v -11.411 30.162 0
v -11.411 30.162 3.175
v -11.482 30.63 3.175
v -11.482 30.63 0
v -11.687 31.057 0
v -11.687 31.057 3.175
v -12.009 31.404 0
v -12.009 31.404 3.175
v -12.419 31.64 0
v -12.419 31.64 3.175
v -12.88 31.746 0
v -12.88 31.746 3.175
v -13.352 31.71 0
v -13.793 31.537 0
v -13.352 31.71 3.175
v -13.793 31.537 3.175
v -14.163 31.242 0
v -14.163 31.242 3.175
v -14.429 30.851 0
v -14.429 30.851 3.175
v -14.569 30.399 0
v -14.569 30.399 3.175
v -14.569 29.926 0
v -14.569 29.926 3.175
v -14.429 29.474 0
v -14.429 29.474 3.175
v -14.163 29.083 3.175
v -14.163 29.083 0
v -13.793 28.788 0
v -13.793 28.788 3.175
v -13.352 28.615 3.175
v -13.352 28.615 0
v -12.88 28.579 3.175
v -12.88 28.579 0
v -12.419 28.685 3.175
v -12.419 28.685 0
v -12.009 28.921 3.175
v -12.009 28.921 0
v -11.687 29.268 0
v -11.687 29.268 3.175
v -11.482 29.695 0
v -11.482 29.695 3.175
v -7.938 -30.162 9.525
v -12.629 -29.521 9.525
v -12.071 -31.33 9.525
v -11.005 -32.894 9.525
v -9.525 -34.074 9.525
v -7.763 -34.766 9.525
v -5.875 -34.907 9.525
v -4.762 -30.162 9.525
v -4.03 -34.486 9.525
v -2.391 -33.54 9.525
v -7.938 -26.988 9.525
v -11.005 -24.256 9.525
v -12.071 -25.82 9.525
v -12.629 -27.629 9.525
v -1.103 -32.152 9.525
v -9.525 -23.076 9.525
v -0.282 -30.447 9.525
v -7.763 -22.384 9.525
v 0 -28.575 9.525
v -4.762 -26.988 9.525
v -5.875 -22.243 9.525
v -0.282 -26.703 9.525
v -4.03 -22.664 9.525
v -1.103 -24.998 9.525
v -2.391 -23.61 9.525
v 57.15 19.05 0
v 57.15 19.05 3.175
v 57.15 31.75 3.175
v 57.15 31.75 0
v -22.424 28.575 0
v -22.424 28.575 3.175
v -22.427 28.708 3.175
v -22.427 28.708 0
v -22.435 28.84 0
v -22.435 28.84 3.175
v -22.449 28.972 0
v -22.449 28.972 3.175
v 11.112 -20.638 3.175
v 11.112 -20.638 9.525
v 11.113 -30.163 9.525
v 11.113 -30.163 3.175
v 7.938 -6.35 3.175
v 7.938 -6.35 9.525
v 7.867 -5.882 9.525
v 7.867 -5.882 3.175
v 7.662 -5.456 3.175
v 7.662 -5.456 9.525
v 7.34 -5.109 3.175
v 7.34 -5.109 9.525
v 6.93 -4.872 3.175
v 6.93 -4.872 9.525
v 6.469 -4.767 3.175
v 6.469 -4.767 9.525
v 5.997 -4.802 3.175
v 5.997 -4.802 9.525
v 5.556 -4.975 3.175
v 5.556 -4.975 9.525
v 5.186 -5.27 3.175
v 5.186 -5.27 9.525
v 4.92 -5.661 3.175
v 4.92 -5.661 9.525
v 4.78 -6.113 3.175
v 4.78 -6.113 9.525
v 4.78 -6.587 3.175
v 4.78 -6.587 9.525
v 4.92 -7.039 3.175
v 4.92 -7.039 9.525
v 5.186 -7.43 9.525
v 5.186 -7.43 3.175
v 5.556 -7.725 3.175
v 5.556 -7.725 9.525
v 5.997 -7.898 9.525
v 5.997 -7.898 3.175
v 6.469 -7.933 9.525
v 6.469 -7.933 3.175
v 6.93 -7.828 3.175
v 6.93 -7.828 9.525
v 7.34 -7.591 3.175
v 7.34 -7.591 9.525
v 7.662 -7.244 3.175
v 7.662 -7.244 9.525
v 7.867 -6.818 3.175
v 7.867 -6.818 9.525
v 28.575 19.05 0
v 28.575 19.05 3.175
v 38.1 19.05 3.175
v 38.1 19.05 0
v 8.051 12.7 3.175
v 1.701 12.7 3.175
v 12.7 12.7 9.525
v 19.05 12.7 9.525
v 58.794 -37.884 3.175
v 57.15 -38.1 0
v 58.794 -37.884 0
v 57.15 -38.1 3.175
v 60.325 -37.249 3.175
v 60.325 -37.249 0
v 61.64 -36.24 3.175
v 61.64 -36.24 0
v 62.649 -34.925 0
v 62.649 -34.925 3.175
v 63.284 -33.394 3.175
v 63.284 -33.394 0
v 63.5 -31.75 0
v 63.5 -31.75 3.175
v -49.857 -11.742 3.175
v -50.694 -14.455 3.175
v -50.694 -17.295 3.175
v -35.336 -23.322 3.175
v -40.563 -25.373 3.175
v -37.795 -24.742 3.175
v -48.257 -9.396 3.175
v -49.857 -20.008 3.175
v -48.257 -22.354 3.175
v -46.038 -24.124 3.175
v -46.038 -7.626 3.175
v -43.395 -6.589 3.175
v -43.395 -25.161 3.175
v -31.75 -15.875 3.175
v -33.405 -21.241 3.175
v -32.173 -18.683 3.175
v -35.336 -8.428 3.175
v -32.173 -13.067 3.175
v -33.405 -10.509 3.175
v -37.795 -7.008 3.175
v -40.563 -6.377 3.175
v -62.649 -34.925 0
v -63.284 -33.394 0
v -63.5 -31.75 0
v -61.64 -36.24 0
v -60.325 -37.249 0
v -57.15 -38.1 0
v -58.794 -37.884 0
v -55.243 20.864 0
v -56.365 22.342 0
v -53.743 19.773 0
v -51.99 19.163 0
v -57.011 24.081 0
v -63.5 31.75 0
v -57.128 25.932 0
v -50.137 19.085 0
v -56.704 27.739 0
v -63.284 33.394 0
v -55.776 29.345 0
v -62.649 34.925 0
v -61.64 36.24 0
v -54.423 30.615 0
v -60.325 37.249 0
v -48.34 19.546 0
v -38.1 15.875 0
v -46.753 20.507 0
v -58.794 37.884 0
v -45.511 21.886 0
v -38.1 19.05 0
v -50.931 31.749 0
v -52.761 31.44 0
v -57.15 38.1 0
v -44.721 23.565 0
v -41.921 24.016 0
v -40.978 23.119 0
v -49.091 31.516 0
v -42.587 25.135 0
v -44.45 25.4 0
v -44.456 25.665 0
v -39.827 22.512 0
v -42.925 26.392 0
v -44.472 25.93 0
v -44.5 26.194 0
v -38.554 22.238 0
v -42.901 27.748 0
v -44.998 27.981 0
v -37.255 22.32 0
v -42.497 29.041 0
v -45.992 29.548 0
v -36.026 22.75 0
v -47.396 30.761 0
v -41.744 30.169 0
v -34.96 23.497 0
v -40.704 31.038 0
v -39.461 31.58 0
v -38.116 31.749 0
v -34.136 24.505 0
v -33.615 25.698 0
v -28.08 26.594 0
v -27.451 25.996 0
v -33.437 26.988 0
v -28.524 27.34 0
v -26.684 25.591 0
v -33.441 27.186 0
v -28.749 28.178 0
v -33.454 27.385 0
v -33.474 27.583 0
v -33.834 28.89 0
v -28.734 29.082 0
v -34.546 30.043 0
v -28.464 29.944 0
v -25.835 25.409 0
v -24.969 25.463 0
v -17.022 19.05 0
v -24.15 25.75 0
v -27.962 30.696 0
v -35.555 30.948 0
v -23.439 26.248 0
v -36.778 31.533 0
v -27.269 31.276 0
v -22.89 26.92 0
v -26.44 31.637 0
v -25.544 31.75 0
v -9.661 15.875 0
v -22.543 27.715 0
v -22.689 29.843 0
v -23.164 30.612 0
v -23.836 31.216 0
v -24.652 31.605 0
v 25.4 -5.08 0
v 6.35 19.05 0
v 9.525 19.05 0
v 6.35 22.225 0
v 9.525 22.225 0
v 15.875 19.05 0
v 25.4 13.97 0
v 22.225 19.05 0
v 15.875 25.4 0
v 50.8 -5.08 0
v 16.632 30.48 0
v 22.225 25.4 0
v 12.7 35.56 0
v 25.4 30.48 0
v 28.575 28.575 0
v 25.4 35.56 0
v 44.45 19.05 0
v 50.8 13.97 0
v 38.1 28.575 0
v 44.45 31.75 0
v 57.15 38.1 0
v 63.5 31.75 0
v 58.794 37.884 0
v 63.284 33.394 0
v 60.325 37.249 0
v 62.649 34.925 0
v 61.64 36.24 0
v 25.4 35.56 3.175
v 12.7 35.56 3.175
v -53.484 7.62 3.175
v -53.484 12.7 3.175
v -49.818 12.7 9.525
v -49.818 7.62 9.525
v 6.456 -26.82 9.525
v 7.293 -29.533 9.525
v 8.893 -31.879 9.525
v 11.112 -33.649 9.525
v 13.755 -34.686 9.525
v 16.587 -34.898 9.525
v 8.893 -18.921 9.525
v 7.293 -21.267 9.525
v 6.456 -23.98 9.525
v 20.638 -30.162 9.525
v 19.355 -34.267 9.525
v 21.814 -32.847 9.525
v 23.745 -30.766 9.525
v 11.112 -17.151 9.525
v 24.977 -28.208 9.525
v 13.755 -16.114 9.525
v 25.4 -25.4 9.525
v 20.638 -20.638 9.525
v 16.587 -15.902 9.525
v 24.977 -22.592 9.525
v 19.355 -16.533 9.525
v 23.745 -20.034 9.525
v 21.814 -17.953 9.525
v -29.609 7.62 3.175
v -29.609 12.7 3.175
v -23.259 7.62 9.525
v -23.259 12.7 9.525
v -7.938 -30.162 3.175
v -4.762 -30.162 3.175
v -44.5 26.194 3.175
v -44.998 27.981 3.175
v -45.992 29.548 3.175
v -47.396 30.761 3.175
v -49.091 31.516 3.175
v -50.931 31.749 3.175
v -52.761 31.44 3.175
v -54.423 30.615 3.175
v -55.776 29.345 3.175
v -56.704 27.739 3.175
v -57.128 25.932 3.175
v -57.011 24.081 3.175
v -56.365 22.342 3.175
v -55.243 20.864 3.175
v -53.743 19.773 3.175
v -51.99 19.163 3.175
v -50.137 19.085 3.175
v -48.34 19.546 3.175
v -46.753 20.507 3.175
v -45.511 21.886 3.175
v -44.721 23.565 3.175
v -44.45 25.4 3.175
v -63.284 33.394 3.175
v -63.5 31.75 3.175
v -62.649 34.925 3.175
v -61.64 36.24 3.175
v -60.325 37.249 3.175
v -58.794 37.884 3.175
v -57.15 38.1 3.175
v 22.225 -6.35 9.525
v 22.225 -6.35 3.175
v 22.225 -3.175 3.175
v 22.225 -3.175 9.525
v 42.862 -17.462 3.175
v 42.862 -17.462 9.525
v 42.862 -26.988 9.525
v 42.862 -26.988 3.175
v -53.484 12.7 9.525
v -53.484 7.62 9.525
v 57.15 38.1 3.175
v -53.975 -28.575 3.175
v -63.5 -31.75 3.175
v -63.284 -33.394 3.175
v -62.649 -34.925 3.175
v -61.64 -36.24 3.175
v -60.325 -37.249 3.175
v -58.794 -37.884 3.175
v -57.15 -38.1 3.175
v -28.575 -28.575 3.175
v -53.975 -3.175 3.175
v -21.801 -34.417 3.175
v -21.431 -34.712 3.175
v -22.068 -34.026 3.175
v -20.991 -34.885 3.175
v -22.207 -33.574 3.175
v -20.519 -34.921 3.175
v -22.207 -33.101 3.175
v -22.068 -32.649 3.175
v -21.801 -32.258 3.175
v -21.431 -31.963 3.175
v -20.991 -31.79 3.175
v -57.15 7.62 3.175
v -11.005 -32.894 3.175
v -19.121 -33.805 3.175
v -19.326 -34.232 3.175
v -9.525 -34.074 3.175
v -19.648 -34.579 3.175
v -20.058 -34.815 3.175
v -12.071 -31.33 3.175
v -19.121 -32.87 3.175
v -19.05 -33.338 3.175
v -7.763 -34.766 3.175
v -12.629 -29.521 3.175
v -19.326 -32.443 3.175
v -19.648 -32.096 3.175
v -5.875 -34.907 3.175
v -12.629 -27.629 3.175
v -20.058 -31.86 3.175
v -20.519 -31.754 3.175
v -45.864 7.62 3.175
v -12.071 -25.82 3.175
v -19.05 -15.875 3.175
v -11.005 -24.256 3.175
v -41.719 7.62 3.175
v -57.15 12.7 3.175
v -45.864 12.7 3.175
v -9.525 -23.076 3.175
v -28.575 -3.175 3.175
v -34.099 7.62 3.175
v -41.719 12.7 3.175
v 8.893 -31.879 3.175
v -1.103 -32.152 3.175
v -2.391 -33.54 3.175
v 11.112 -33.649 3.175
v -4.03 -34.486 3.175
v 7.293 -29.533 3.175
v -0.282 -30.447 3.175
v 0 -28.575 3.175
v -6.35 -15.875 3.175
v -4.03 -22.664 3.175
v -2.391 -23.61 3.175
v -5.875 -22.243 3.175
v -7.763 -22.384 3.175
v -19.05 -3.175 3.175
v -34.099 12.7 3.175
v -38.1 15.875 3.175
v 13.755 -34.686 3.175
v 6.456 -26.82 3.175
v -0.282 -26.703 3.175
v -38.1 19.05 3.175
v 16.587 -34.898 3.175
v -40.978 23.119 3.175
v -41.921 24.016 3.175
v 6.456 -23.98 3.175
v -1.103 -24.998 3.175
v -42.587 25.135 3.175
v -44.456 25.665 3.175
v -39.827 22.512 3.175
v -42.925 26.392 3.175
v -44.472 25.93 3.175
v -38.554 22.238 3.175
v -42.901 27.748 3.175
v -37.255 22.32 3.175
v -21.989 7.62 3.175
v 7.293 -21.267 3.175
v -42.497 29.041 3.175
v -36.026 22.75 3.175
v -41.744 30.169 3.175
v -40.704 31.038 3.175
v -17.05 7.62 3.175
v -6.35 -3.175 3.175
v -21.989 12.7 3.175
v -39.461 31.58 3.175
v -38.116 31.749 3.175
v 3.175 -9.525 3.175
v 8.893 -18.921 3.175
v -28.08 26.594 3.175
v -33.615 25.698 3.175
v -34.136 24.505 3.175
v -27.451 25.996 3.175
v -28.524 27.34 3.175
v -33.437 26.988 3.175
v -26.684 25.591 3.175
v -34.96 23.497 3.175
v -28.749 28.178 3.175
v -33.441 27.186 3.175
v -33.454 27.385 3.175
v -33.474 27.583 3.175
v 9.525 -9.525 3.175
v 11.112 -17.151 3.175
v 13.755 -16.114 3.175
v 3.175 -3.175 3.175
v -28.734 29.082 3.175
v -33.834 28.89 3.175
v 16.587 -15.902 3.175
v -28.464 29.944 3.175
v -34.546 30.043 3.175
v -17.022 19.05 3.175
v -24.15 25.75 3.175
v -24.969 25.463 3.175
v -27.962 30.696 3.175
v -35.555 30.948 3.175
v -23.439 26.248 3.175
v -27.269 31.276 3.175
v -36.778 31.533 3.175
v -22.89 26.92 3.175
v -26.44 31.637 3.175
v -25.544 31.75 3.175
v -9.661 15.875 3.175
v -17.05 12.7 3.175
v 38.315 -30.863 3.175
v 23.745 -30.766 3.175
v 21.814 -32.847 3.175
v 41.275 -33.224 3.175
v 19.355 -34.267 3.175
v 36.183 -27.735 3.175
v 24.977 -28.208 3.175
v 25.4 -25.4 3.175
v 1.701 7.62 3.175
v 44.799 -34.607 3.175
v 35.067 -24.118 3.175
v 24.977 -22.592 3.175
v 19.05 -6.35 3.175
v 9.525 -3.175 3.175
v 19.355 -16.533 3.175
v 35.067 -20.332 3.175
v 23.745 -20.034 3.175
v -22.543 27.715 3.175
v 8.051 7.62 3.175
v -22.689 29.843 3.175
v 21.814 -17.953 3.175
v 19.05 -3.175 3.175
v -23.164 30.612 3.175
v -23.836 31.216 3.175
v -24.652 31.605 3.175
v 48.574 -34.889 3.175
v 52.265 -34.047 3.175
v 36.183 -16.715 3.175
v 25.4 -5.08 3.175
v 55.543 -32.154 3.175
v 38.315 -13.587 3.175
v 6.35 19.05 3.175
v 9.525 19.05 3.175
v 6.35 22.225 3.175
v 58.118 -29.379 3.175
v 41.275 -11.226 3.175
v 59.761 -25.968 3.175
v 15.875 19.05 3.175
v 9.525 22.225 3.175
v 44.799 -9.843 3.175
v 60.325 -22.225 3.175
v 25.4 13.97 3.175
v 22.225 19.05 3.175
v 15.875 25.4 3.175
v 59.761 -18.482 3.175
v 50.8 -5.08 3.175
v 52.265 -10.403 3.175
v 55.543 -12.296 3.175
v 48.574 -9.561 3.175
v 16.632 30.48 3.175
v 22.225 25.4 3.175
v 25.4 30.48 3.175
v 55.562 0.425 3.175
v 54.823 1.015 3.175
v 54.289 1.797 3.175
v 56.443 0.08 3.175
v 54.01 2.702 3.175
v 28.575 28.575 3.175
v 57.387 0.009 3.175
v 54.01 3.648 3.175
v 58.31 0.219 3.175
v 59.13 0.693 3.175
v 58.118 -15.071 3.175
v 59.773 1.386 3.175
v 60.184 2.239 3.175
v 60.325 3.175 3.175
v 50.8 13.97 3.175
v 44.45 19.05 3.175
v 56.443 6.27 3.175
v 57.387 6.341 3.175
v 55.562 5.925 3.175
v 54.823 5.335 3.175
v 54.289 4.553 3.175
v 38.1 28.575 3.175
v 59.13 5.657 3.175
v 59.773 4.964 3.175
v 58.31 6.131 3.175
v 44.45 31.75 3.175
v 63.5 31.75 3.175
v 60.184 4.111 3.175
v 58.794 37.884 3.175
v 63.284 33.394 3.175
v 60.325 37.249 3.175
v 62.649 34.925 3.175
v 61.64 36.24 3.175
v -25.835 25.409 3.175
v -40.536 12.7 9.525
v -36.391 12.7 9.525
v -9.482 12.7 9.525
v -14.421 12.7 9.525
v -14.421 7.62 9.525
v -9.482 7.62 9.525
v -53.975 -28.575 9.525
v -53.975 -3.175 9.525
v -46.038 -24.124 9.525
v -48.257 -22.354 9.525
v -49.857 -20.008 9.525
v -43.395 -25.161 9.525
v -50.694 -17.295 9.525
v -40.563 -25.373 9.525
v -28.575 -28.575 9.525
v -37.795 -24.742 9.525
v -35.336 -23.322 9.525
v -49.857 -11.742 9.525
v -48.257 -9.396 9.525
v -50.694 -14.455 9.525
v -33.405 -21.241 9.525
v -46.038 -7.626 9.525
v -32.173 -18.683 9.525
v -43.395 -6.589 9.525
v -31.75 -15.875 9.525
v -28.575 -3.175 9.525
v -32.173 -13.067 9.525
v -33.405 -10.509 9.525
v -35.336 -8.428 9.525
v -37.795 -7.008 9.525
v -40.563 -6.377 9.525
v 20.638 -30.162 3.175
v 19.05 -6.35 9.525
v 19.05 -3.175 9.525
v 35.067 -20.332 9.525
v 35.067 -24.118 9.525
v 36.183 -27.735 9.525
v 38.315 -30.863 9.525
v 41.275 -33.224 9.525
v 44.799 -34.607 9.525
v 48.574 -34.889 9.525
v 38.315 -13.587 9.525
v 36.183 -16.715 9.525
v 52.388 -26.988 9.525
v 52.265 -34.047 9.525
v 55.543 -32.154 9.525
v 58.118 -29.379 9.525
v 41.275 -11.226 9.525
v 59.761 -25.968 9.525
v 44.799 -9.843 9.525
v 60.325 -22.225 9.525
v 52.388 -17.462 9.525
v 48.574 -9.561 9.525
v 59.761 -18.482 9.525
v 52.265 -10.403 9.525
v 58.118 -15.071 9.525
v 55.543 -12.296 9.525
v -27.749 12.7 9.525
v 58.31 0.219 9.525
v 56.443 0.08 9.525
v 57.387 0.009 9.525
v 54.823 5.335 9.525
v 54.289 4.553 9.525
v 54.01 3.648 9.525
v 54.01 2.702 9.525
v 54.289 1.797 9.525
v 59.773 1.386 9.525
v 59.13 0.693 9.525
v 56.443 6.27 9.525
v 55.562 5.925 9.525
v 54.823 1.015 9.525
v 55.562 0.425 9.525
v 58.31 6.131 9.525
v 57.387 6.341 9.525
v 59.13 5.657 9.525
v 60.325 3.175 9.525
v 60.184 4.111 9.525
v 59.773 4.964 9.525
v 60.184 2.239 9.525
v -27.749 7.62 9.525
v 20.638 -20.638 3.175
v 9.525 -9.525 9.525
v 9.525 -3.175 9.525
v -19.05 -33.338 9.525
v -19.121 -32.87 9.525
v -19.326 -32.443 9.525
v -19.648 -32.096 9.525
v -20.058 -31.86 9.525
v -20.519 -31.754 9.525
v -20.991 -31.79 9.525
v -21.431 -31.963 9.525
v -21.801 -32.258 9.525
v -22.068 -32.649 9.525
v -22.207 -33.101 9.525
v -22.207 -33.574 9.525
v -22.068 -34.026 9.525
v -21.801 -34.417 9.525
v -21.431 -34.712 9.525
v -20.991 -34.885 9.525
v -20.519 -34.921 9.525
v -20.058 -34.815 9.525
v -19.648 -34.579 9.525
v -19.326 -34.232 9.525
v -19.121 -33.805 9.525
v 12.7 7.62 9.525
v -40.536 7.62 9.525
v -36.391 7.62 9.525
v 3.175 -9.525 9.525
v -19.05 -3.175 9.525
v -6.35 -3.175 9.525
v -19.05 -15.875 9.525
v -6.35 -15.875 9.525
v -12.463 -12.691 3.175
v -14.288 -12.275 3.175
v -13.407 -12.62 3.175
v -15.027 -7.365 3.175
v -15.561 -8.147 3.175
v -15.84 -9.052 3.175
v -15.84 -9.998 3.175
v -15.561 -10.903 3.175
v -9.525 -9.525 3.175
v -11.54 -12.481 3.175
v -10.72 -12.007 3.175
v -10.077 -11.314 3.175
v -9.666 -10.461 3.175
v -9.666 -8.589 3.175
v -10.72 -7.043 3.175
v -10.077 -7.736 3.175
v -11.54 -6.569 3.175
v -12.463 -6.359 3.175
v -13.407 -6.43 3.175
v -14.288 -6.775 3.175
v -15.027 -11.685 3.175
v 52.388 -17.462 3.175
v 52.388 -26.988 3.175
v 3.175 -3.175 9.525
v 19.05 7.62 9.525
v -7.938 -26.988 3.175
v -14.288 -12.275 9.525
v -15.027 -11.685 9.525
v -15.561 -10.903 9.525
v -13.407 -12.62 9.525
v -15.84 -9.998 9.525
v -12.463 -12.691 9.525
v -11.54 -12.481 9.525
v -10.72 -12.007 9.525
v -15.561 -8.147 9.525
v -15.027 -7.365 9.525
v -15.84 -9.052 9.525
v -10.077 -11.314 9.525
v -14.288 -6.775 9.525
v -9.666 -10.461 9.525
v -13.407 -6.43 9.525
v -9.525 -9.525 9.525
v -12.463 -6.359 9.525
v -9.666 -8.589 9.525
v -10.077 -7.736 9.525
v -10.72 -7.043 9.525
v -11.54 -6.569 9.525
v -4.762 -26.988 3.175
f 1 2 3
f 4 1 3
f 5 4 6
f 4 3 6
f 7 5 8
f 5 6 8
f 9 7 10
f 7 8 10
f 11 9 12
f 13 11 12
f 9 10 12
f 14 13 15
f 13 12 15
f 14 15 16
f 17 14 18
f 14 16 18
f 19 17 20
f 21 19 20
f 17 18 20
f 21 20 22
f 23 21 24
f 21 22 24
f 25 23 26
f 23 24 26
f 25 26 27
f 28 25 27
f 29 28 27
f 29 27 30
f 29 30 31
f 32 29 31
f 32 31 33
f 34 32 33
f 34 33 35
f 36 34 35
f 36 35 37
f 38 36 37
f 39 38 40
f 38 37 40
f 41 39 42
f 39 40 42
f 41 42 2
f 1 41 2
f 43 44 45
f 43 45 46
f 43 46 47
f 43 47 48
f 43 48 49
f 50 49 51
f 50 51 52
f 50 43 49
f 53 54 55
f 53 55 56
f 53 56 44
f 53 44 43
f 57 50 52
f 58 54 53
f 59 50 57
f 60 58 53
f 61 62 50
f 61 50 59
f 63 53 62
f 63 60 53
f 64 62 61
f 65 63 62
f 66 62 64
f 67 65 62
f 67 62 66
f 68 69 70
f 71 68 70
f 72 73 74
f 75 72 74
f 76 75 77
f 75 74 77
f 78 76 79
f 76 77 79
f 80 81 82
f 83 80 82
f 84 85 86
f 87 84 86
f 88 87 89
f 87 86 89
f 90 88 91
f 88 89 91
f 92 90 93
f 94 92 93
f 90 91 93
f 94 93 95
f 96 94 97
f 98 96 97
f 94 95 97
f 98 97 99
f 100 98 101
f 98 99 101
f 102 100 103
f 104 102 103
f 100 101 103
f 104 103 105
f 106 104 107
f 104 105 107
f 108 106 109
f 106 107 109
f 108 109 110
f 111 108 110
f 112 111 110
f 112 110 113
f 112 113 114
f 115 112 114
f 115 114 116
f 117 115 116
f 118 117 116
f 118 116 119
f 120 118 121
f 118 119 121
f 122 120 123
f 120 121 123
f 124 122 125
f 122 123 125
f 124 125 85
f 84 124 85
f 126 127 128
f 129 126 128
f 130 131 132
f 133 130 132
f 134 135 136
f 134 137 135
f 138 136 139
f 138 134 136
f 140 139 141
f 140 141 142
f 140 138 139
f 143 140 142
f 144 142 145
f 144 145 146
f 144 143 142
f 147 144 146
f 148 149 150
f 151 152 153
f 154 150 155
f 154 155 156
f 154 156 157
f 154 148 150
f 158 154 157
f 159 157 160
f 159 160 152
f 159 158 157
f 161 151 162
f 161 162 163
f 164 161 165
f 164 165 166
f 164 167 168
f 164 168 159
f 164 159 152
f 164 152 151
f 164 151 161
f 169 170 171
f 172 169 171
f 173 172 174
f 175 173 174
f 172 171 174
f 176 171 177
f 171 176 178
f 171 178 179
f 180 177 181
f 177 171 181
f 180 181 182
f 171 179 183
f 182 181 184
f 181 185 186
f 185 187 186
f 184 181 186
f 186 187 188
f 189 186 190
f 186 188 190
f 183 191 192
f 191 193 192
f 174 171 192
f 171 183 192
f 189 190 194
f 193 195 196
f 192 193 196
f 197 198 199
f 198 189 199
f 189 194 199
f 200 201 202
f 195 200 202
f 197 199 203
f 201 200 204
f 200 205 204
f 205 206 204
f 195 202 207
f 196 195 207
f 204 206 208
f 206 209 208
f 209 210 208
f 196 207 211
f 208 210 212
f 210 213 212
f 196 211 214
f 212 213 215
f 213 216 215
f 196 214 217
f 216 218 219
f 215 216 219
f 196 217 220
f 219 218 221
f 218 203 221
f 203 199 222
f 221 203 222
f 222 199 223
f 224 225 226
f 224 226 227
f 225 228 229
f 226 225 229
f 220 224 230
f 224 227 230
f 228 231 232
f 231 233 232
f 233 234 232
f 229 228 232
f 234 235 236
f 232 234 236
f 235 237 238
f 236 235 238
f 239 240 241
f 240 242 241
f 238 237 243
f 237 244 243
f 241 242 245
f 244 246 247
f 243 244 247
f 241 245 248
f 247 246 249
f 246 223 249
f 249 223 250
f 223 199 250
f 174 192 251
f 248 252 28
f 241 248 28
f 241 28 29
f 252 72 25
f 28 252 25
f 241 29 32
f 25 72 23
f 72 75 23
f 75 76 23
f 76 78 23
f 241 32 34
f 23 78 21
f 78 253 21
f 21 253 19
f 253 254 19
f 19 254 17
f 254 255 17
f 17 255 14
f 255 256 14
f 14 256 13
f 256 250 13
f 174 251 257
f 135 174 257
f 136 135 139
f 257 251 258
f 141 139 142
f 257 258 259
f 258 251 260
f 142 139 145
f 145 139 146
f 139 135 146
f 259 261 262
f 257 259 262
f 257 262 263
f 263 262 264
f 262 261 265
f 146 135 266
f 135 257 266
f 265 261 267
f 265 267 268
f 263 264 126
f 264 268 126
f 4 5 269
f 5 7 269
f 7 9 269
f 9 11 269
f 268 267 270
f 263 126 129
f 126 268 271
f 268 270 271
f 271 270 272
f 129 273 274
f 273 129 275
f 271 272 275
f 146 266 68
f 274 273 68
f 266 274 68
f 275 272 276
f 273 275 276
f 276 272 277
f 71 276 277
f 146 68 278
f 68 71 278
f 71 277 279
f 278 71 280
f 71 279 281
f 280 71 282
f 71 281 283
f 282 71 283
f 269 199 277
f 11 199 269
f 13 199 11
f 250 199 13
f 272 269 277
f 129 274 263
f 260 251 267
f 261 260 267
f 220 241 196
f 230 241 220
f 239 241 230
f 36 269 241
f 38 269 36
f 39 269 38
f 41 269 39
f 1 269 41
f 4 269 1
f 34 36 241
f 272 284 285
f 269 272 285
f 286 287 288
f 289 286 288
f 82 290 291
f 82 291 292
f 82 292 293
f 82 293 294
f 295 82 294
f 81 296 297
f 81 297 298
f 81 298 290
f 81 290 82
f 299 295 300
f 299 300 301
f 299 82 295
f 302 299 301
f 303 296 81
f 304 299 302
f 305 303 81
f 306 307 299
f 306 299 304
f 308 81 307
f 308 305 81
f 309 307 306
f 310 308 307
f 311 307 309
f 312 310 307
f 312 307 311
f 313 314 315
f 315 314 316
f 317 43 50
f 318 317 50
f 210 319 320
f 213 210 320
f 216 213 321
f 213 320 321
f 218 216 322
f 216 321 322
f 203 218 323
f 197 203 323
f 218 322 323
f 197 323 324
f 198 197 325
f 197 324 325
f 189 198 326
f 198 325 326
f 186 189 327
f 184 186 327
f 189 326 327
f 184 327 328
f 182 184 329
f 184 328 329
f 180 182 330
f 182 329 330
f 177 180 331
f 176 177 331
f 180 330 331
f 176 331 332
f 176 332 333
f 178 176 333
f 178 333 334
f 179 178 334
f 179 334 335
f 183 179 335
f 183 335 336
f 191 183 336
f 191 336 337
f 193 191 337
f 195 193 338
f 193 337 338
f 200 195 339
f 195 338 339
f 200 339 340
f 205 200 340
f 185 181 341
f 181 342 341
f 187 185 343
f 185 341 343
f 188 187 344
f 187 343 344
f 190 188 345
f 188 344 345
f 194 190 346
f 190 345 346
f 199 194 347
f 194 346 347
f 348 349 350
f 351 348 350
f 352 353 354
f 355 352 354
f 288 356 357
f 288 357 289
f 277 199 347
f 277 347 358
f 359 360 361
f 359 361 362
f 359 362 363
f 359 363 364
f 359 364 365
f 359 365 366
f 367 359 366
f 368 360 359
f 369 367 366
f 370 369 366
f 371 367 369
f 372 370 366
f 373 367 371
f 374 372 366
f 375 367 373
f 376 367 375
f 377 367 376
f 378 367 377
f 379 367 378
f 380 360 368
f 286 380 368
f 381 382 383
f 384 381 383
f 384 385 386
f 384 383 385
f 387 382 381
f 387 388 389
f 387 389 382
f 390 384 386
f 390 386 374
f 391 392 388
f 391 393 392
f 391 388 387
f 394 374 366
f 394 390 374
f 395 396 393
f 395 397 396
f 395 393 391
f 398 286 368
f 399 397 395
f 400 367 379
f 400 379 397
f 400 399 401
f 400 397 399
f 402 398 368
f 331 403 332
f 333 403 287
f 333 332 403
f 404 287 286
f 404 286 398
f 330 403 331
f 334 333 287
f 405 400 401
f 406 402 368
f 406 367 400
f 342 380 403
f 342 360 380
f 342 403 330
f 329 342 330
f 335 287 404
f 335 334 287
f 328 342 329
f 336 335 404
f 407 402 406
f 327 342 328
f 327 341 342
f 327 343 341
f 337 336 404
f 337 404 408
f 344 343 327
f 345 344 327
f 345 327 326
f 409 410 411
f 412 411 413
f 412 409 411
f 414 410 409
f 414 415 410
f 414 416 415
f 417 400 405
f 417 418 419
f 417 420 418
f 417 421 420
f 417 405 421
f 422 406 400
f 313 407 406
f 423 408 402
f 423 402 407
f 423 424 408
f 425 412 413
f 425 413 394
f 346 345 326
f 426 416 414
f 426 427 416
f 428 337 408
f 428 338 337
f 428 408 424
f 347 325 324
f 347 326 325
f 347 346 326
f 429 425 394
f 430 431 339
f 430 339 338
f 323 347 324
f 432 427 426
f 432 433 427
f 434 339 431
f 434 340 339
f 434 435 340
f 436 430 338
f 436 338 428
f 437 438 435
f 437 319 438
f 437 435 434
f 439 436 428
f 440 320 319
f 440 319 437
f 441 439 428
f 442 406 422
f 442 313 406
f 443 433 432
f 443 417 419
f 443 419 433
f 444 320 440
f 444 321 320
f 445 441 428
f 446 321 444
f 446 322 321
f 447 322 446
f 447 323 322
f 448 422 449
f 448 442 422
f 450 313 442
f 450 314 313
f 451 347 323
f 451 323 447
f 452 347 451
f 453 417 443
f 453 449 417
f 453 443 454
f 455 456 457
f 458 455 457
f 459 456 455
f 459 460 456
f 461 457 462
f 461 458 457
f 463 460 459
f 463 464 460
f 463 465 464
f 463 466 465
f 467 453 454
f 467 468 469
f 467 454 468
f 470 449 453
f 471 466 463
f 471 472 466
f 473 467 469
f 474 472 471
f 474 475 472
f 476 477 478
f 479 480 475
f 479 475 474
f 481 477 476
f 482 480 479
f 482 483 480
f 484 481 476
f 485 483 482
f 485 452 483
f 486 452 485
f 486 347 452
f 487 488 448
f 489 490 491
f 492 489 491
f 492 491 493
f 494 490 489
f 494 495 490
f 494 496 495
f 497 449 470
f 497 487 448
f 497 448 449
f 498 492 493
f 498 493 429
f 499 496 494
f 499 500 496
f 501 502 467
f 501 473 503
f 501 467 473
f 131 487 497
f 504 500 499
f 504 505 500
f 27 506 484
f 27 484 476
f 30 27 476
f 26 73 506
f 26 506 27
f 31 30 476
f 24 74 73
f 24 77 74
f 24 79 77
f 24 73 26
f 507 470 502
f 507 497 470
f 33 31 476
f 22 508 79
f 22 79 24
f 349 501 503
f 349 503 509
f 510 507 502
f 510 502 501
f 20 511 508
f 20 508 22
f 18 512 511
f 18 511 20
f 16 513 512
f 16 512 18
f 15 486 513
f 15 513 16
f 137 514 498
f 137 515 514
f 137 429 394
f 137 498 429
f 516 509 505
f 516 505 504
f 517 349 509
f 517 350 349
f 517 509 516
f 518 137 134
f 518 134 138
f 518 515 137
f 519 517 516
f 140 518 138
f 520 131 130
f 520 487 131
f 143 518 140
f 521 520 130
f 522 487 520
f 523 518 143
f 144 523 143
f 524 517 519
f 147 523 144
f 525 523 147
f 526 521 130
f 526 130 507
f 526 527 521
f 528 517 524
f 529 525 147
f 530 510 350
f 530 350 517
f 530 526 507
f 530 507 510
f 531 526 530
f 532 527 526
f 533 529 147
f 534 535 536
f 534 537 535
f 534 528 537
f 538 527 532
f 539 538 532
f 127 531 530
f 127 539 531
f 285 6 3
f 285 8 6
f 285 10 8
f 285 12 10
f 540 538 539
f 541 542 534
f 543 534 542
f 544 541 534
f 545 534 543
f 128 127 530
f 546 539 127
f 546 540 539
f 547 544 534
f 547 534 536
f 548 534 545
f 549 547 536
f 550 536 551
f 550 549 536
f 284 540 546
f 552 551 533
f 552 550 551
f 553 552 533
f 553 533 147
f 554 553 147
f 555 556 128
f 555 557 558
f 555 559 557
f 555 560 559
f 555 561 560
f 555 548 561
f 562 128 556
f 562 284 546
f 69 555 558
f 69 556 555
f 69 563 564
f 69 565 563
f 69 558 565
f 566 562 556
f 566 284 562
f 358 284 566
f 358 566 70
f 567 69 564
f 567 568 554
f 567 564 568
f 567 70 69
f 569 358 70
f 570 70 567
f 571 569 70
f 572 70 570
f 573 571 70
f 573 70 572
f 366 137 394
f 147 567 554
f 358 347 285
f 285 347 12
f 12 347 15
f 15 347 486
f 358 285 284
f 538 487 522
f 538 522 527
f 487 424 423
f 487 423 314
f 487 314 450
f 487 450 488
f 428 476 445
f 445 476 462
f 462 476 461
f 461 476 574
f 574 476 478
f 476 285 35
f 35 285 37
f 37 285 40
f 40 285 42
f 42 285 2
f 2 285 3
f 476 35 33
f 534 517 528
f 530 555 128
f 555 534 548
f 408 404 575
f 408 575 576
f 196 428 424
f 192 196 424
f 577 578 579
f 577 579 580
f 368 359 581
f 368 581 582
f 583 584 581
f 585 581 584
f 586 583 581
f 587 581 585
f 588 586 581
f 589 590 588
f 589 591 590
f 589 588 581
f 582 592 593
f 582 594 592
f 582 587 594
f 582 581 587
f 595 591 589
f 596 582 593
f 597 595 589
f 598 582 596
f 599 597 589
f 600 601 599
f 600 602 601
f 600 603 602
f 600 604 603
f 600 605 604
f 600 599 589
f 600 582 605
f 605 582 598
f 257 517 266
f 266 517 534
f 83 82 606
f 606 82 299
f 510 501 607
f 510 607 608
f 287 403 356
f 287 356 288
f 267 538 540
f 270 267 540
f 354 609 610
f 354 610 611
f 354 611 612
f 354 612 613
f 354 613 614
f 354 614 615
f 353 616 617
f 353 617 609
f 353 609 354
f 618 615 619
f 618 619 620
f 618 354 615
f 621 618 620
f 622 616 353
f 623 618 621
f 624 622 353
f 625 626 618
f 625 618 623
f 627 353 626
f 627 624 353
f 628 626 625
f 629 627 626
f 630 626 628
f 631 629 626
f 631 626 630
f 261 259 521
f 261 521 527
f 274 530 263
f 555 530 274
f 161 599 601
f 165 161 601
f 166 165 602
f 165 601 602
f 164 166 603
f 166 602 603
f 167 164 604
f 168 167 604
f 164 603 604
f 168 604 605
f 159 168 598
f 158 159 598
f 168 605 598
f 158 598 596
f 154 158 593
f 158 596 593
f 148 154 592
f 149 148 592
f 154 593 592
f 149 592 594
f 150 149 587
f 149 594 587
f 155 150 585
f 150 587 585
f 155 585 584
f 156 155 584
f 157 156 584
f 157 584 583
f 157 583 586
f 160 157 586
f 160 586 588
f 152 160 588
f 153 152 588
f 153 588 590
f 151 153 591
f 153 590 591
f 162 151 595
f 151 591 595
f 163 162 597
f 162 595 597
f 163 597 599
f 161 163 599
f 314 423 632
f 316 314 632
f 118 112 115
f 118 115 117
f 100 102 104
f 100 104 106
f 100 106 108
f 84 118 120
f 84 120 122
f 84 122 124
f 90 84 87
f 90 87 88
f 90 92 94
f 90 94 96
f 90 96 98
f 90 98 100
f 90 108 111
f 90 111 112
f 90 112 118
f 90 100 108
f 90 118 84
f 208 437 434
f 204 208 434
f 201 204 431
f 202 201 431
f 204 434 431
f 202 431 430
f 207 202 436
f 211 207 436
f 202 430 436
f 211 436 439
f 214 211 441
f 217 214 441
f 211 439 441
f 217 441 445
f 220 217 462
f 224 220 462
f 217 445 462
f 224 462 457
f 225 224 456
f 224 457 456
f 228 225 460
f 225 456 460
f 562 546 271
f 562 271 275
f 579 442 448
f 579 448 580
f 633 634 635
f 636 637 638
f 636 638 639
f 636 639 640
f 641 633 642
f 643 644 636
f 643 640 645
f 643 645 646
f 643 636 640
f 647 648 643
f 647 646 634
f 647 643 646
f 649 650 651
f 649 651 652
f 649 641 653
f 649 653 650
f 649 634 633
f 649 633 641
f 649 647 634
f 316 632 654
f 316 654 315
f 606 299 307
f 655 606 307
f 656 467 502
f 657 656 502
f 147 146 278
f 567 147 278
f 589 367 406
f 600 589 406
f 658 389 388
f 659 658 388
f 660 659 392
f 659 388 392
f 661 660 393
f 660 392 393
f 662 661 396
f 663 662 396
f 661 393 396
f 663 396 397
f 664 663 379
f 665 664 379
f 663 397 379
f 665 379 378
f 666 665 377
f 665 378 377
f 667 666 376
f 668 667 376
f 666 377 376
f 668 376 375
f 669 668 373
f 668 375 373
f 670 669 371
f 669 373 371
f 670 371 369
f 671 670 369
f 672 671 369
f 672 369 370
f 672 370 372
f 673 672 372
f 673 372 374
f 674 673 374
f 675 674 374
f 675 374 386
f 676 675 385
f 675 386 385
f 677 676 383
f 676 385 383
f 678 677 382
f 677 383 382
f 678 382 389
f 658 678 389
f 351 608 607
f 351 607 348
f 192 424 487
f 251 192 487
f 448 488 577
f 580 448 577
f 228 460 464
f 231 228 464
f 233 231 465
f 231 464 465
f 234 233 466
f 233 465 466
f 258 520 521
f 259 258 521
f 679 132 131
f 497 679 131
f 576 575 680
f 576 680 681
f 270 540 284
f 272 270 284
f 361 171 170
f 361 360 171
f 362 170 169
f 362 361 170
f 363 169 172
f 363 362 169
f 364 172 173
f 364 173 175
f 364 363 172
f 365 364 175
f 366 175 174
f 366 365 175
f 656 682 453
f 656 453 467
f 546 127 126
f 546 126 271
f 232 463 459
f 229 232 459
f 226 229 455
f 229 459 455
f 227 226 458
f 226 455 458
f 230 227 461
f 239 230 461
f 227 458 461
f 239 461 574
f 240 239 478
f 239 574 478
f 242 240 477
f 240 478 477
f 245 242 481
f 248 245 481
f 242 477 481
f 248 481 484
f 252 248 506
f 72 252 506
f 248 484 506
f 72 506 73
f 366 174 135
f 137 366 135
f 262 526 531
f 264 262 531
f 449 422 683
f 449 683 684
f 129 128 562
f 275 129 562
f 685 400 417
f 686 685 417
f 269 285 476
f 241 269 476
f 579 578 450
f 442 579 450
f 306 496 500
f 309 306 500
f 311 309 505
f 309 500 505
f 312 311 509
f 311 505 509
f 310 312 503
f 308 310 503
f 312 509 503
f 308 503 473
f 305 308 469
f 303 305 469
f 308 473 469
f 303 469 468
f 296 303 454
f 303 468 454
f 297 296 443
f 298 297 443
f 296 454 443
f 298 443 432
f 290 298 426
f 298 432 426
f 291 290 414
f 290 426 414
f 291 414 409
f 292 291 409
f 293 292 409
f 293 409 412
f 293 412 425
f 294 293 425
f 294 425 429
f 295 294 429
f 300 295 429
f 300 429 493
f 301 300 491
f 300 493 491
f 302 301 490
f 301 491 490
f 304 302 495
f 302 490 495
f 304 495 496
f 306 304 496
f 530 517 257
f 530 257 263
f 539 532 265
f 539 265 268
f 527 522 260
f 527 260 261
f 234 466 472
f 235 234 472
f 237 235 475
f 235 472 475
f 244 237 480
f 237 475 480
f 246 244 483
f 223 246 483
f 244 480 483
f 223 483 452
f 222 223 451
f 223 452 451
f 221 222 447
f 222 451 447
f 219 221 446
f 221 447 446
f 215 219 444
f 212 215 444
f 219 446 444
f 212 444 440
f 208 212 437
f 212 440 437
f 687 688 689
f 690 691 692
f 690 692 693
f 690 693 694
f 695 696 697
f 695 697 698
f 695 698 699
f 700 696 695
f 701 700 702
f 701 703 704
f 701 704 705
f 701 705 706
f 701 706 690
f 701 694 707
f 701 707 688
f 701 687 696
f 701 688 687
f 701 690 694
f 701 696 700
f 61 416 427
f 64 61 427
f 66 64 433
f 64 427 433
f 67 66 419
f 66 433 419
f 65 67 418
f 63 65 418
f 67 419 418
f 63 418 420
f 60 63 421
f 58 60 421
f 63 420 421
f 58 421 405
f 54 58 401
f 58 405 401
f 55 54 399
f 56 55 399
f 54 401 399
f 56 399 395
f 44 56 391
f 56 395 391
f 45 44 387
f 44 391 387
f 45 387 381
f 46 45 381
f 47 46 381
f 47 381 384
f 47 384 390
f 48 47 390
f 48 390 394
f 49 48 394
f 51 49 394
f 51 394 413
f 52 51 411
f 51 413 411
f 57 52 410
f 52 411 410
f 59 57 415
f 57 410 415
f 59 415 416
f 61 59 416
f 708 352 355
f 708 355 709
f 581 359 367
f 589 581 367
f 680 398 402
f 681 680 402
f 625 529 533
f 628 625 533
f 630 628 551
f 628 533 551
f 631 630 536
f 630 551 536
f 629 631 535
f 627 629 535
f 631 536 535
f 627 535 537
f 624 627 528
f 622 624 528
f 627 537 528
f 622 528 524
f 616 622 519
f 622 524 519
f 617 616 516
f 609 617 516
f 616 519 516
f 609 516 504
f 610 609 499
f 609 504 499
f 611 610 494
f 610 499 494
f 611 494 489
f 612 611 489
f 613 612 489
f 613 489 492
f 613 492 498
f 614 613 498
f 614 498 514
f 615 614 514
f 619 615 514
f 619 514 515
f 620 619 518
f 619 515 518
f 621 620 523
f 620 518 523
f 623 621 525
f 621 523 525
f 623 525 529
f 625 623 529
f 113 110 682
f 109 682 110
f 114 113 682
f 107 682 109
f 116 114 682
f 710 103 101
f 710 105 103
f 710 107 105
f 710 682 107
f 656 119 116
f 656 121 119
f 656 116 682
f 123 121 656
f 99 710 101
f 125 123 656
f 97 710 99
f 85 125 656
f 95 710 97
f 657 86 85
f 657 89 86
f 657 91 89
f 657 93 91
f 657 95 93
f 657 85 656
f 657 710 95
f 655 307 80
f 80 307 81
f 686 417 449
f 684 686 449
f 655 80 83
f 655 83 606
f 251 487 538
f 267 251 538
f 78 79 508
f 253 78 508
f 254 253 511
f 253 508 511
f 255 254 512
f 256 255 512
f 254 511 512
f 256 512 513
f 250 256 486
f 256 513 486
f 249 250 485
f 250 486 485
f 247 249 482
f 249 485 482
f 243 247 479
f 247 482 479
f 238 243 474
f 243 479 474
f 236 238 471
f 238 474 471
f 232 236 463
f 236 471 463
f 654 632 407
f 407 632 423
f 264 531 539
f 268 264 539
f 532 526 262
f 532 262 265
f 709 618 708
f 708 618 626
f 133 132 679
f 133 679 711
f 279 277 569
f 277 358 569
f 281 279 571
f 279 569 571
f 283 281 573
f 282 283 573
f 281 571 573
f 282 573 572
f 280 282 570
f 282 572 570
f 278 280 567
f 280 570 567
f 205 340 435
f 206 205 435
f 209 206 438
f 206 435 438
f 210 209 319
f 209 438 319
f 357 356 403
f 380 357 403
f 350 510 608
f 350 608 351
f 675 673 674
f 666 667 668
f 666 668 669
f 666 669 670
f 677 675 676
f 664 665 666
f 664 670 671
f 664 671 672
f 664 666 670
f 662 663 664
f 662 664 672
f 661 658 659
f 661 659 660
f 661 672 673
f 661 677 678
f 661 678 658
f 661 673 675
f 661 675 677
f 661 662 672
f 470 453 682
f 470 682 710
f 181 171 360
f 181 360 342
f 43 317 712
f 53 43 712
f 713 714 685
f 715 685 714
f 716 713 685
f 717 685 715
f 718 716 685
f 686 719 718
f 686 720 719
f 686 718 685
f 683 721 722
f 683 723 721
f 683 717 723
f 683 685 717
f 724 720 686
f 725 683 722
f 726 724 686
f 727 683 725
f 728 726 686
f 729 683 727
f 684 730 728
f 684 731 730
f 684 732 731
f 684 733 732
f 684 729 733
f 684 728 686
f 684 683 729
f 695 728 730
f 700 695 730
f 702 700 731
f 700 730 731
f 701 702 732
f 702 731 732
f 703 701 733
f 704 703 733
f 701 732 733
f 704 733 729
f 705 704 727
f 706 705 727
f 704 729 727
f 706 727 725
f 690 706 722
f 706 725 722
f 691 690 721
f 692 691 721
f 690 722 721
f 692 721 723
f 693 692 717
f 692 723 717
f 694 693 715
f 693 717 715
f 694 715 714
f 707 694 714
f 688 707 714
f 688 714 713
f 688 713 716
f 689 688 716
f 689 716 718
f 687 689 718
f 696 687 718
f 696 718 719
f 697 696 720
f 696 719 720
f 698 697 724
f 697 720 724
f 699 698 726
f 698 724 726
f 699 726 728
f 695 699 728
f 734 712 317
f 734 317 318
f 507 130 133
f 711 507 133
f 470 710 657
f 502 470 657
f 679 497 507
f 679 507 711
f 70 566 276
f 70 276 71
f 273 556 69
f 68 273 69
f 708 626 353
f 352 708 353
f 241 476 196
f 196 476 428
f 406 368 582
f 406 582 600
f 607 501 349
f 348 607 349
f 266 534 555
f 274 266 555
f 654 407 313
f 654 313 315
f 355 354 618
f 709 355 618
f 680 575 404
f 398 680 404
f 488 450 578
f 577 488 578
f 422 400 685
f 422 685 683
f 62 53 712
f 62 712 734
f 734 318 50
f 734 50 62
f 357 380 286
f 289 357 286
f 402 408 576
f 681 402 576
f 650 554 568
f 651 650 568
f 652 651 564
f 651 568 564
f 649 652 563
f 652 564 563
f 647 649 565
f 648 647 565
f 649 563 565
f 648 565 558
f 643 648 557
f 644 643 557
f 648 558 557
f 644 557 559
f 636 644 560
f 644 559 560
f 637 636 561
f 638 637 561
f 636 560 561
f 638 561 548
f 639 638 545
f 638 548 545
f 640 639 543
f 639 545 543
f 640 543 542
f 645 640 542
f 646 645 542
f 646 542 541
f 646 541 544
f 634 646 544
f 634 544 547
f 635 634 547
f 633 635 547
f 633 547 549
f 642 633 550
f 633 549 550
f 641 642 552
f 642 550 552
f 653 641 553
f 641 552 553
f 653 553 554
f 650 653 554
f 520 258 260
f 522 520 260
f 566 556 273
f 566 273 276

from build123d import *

# Parameters (mm, degrees)
F0_W      = 127
F0_H      = 76.2
F1_DEPTH  = 3.175
F2_R      = 1.5875
F2_W      = 12.7
F2_H      = 12.7
F2_W_2    = 9.525
F2_H_2    = 9.525
F2_W_3    = 6.35
F2_H_3    = 6.35
F2_W_4    = 3.175
F2_H_4    = 3.175
F3_DEPTH  = 3.175
F4_W      = 25.4
F4_H      = 25.4
F4_W_2    = 12.7
F4_H_2    = 12.7
F4_W_3    = 6.35
F4_H_3    = 6.35
F4_W_4    = 3.175
F4_H_4    = 3.175
F5_DEPTH  = 6.35
F6_R      = 9.525
F6_R_2    = 3.175
F6_R_3    = 1.5875
F7_DEPTH  = 6.35
F8_R      = 12.7
F8_R_2    = 6.35
F8_R_3    = 9.525
F8_R_4    = 3.175
F8_R_5    = 1.5875
F9_DEPTH  = 6.35
F10_W     = 3.175
F10_H     = 3.175
F11_DEPTH = 6.35
F12_W     = 76.2
F12_H     = 5.08
F13_DEPTH = 6.35
F15_DEPTH = 5.08
F16_R     = 6.35
F18_DEPTH = 3.175
F19_W     = 25.4
F19_H     = 19.05
F20_DEPTH = 3.175


with BuildPart() as f1:
    # F0 (on Top) → F1 (new body)
    with BuildSketch(Plane.XY):
        Rectangle(F0_W, F0_H)
    extrude(amount=F1_DEPTH)

    # F2 (on face) → F3 (cut, through all)
    with BuildSketch(Plane.XY.offset(3.175)):
        with BuildLine():
            ThreePointArc((-44.499805, 26.19375), (-57.137537, 25.002345), (-44.45, 25.4))
            ThreePointArc((-44.45, 25.4), (-44.462463, 25.797655), (-44.499805, 26.19375))
        make_face()
        with BuildLine():
            ThreePointArc((-22.449121, 28.971875), (-25.996094, 31.725098), (-28.749316, 28.178125))
            Line((-28.749316, 28.178125), (-22.449121, 28.971875))
        make_face()
        with BuildLine():
            Line((-22.449121, 28.971875), (-28.749316, 28.178125))
            ThreePointArc((-28.749316, 28.178125), (-25.400391, 25.406232), (-22.424219, 28.575))
            ThreePointArc((-22.424219, 28.575), (-22.43045, 28.773828), (-22.449121, 28.971875))
        make_face()
        with BuildLine():
            ThreePointArc((-33.474463, 27.582813), (-38.794922, 31.712646), (-42.924756, 26.392188))
            Line((-42.924756, 26.392188), (-33.474463, 27.582813))
        make_face()
        with BuildLine():
            Line((-33.474463, 27.582813), (-42.924756, 26.392188))
            ThreePointArc((-42.924756, 26.392188), (-37.901368, 22.234348), (-33.437109, 26.9875))
            ThreePointArc((-33.437109, 26.9875), (-33.446457, 27.285742), (-33.474463, 27.582813))
        make_face()
        with Locations((-12.998828, 30.1625)):
            Circle(F2_R)
        with Locations((50.8, 25.4)):
            Rectangle(F2_W, F2_H)
        with Locations((33.3375, 23.8125)):
            Rectangle(F2_W_2, F2_H_2)
        with Locations((19.05, 22.225)):
            Rectangle(F2_W_3, F2_H_3)
        with Locations((7.9375, 20.6375)):
            Rectangle(F2_W_4, F2_H_4)
    extrude(amount=-F3_DEPTH, mode=Mode.SUBTRACT)

    # F4 (on face) → F5 (join)
    with BuildSketch(Plane.XY.offset(3.175)):
        with Locations((-41.275, -15.875)):
            Rectangle(F4_W, F4_H)
        with Locations((-12.7, -9.525)):
            Rectangle(F4_W_2, F4_H_2)
        with Locations((6.35, -6.35)):
            Rectangle(F4_W_3, F4_H_3)
        with Locations((20.6375, -4.7625)):
            Rectangle(F4_W_4, F4_H_4)
    extrude(amount=F5_DEPTH)

    # F6 (on face) → F7 (cut)
    with BuildSketch(Plane.XY.offset(9.525)):
        with Locations((-41.275, -15.875)):
            Circle(F6_R)
        with Locations((-12.7, -9.525)):
            Circle(F6_R_2)
        with Locations((6.35, -6.35)):
            Circle(F6_R_3)
    extrude(amount=-F7_DEPTH, mode=Mode.SUBTRACT)

    # F8 (on face) → F9 (join)
    with BuildSketch(Plane.XY.offset(3.175)):
        with Locations((47.625, -22.225)):
            Circle(F8_R)
        with Locations((-6.35, -28.575)):
            Circle(F8_R_2)
        with Locations((15.875, -25.4)):
            Circle(F8_R_3)
        with Locations((57.15, 3.175)):
            Circle(F8_R_4)
        with Locations((-20.6375, -33.3375)):
            Circle(F8_R_5)
    extrude(amount=F9_DEPTH)

    # F10 (on face) → F11 (cut)
    with BuildSketch(Plane.XY.offset(9.525)):
        Polygon((52.3875, -17.4625), (42.8625, -17.4625), (42.8625, -26.9875), align=None)
        Polygon((52.3875, -26.9875), (52.3875, -17.4625), (42.8625, -26.9875), align=None)
        Polygon((20.6375, -20.6375), (11.1125, -20.6375), (11.1125, -30.1625), align=None)
        Polygon((20.6375, -30.1625), (20.6375, -20.6375), (11.1125, -30.1625), align=None)
        with Locations((-6.35, -28.575)):
            Rectangle(F10_W, F10_H)
    extrude(amount=-F11_DEPTH, mode=Mode.SUBTRACT)

    # F12 (on face) → F13 (join)
    with BuildSketch(Plane.XY.offset(3.175)):
        with Locations((-19.05, 10.16)):
            Rectangle(F12_W, F12_H)
    extrude(amount=F13_DEPTH)

    # F14 (on face) → F15 (cut, through all)
    with BuildSketch(Plane(origin=(0, 12.7, 0), x_dir=(-1, 0, 0), z_dir=(0, 1, 0))):
        Polygon((53.483826, 9.525), (57.15, 3.175), (57.15, 9.525), align=None)
        Polygon((45.863826, 3.175), (53.483826, 3.175), (49.817652, 9.525), (40.535543, 9.525), align=None)
        Polygon((34.099158, 3.175), (41.719158, 3.175), (36.390875, 9.525), (27.749158, 9.525), align=None)
        Polygon((14.421394, 9.525), (21.98903, 3.175), (29.60903, 3.175), (23.25903, 9.525), align=None)
        Polygon((-1.701477, 3.175), (17.049606, 3.175), (9.481971, 9.525), (-12.7, 9.525), align=None)
        Polygon((-19.05, 3.175), (-8.051477, 3.175), (-19.05, 9.525), align=None)
    extrude(amount=-F15_DEPTH, mode=Mode.SUBTRACT)

    # F16
    f16_edges = [f1.edges().sort_by_distance(p)[0] for p in [
        (63.5, -38.1, 1.5875),
        (-63.5, -38.1, 1.5875),
        (-63.5, 38.1, 1.5875),
        (63.5, 38.1, 1.5875),
    ]]
    fillet(f16_edges, radius=F16_R)

    # F17 (on face) → F18 (cut, through all)
    with BuildSketch(Plane.XY.offset(3.175)):
        Polygon((-9.660837, 15.875), (16.63156, 30.48), (25.4, 30.48), (25.4, 35.56), (12.7, 35.56), (-17.021839, 19.05), (-38.1, 19.05), (-38.1, 15.875), align=None)
    extrude(amount=-F18_DEPTH, mode=Mode.SUBTRACT)

    # F19 (on face) → F20 (cut, through all)
    with BuildSketch(Plane.XY.offset(3.175)):
        with Locations((38.1, 4.445)):
            Rectangle(F19_W, F19_H)
    extrude(amount=-F20_DEPTH, mode=Mode.SUBTRACT)


solid = f1.part
